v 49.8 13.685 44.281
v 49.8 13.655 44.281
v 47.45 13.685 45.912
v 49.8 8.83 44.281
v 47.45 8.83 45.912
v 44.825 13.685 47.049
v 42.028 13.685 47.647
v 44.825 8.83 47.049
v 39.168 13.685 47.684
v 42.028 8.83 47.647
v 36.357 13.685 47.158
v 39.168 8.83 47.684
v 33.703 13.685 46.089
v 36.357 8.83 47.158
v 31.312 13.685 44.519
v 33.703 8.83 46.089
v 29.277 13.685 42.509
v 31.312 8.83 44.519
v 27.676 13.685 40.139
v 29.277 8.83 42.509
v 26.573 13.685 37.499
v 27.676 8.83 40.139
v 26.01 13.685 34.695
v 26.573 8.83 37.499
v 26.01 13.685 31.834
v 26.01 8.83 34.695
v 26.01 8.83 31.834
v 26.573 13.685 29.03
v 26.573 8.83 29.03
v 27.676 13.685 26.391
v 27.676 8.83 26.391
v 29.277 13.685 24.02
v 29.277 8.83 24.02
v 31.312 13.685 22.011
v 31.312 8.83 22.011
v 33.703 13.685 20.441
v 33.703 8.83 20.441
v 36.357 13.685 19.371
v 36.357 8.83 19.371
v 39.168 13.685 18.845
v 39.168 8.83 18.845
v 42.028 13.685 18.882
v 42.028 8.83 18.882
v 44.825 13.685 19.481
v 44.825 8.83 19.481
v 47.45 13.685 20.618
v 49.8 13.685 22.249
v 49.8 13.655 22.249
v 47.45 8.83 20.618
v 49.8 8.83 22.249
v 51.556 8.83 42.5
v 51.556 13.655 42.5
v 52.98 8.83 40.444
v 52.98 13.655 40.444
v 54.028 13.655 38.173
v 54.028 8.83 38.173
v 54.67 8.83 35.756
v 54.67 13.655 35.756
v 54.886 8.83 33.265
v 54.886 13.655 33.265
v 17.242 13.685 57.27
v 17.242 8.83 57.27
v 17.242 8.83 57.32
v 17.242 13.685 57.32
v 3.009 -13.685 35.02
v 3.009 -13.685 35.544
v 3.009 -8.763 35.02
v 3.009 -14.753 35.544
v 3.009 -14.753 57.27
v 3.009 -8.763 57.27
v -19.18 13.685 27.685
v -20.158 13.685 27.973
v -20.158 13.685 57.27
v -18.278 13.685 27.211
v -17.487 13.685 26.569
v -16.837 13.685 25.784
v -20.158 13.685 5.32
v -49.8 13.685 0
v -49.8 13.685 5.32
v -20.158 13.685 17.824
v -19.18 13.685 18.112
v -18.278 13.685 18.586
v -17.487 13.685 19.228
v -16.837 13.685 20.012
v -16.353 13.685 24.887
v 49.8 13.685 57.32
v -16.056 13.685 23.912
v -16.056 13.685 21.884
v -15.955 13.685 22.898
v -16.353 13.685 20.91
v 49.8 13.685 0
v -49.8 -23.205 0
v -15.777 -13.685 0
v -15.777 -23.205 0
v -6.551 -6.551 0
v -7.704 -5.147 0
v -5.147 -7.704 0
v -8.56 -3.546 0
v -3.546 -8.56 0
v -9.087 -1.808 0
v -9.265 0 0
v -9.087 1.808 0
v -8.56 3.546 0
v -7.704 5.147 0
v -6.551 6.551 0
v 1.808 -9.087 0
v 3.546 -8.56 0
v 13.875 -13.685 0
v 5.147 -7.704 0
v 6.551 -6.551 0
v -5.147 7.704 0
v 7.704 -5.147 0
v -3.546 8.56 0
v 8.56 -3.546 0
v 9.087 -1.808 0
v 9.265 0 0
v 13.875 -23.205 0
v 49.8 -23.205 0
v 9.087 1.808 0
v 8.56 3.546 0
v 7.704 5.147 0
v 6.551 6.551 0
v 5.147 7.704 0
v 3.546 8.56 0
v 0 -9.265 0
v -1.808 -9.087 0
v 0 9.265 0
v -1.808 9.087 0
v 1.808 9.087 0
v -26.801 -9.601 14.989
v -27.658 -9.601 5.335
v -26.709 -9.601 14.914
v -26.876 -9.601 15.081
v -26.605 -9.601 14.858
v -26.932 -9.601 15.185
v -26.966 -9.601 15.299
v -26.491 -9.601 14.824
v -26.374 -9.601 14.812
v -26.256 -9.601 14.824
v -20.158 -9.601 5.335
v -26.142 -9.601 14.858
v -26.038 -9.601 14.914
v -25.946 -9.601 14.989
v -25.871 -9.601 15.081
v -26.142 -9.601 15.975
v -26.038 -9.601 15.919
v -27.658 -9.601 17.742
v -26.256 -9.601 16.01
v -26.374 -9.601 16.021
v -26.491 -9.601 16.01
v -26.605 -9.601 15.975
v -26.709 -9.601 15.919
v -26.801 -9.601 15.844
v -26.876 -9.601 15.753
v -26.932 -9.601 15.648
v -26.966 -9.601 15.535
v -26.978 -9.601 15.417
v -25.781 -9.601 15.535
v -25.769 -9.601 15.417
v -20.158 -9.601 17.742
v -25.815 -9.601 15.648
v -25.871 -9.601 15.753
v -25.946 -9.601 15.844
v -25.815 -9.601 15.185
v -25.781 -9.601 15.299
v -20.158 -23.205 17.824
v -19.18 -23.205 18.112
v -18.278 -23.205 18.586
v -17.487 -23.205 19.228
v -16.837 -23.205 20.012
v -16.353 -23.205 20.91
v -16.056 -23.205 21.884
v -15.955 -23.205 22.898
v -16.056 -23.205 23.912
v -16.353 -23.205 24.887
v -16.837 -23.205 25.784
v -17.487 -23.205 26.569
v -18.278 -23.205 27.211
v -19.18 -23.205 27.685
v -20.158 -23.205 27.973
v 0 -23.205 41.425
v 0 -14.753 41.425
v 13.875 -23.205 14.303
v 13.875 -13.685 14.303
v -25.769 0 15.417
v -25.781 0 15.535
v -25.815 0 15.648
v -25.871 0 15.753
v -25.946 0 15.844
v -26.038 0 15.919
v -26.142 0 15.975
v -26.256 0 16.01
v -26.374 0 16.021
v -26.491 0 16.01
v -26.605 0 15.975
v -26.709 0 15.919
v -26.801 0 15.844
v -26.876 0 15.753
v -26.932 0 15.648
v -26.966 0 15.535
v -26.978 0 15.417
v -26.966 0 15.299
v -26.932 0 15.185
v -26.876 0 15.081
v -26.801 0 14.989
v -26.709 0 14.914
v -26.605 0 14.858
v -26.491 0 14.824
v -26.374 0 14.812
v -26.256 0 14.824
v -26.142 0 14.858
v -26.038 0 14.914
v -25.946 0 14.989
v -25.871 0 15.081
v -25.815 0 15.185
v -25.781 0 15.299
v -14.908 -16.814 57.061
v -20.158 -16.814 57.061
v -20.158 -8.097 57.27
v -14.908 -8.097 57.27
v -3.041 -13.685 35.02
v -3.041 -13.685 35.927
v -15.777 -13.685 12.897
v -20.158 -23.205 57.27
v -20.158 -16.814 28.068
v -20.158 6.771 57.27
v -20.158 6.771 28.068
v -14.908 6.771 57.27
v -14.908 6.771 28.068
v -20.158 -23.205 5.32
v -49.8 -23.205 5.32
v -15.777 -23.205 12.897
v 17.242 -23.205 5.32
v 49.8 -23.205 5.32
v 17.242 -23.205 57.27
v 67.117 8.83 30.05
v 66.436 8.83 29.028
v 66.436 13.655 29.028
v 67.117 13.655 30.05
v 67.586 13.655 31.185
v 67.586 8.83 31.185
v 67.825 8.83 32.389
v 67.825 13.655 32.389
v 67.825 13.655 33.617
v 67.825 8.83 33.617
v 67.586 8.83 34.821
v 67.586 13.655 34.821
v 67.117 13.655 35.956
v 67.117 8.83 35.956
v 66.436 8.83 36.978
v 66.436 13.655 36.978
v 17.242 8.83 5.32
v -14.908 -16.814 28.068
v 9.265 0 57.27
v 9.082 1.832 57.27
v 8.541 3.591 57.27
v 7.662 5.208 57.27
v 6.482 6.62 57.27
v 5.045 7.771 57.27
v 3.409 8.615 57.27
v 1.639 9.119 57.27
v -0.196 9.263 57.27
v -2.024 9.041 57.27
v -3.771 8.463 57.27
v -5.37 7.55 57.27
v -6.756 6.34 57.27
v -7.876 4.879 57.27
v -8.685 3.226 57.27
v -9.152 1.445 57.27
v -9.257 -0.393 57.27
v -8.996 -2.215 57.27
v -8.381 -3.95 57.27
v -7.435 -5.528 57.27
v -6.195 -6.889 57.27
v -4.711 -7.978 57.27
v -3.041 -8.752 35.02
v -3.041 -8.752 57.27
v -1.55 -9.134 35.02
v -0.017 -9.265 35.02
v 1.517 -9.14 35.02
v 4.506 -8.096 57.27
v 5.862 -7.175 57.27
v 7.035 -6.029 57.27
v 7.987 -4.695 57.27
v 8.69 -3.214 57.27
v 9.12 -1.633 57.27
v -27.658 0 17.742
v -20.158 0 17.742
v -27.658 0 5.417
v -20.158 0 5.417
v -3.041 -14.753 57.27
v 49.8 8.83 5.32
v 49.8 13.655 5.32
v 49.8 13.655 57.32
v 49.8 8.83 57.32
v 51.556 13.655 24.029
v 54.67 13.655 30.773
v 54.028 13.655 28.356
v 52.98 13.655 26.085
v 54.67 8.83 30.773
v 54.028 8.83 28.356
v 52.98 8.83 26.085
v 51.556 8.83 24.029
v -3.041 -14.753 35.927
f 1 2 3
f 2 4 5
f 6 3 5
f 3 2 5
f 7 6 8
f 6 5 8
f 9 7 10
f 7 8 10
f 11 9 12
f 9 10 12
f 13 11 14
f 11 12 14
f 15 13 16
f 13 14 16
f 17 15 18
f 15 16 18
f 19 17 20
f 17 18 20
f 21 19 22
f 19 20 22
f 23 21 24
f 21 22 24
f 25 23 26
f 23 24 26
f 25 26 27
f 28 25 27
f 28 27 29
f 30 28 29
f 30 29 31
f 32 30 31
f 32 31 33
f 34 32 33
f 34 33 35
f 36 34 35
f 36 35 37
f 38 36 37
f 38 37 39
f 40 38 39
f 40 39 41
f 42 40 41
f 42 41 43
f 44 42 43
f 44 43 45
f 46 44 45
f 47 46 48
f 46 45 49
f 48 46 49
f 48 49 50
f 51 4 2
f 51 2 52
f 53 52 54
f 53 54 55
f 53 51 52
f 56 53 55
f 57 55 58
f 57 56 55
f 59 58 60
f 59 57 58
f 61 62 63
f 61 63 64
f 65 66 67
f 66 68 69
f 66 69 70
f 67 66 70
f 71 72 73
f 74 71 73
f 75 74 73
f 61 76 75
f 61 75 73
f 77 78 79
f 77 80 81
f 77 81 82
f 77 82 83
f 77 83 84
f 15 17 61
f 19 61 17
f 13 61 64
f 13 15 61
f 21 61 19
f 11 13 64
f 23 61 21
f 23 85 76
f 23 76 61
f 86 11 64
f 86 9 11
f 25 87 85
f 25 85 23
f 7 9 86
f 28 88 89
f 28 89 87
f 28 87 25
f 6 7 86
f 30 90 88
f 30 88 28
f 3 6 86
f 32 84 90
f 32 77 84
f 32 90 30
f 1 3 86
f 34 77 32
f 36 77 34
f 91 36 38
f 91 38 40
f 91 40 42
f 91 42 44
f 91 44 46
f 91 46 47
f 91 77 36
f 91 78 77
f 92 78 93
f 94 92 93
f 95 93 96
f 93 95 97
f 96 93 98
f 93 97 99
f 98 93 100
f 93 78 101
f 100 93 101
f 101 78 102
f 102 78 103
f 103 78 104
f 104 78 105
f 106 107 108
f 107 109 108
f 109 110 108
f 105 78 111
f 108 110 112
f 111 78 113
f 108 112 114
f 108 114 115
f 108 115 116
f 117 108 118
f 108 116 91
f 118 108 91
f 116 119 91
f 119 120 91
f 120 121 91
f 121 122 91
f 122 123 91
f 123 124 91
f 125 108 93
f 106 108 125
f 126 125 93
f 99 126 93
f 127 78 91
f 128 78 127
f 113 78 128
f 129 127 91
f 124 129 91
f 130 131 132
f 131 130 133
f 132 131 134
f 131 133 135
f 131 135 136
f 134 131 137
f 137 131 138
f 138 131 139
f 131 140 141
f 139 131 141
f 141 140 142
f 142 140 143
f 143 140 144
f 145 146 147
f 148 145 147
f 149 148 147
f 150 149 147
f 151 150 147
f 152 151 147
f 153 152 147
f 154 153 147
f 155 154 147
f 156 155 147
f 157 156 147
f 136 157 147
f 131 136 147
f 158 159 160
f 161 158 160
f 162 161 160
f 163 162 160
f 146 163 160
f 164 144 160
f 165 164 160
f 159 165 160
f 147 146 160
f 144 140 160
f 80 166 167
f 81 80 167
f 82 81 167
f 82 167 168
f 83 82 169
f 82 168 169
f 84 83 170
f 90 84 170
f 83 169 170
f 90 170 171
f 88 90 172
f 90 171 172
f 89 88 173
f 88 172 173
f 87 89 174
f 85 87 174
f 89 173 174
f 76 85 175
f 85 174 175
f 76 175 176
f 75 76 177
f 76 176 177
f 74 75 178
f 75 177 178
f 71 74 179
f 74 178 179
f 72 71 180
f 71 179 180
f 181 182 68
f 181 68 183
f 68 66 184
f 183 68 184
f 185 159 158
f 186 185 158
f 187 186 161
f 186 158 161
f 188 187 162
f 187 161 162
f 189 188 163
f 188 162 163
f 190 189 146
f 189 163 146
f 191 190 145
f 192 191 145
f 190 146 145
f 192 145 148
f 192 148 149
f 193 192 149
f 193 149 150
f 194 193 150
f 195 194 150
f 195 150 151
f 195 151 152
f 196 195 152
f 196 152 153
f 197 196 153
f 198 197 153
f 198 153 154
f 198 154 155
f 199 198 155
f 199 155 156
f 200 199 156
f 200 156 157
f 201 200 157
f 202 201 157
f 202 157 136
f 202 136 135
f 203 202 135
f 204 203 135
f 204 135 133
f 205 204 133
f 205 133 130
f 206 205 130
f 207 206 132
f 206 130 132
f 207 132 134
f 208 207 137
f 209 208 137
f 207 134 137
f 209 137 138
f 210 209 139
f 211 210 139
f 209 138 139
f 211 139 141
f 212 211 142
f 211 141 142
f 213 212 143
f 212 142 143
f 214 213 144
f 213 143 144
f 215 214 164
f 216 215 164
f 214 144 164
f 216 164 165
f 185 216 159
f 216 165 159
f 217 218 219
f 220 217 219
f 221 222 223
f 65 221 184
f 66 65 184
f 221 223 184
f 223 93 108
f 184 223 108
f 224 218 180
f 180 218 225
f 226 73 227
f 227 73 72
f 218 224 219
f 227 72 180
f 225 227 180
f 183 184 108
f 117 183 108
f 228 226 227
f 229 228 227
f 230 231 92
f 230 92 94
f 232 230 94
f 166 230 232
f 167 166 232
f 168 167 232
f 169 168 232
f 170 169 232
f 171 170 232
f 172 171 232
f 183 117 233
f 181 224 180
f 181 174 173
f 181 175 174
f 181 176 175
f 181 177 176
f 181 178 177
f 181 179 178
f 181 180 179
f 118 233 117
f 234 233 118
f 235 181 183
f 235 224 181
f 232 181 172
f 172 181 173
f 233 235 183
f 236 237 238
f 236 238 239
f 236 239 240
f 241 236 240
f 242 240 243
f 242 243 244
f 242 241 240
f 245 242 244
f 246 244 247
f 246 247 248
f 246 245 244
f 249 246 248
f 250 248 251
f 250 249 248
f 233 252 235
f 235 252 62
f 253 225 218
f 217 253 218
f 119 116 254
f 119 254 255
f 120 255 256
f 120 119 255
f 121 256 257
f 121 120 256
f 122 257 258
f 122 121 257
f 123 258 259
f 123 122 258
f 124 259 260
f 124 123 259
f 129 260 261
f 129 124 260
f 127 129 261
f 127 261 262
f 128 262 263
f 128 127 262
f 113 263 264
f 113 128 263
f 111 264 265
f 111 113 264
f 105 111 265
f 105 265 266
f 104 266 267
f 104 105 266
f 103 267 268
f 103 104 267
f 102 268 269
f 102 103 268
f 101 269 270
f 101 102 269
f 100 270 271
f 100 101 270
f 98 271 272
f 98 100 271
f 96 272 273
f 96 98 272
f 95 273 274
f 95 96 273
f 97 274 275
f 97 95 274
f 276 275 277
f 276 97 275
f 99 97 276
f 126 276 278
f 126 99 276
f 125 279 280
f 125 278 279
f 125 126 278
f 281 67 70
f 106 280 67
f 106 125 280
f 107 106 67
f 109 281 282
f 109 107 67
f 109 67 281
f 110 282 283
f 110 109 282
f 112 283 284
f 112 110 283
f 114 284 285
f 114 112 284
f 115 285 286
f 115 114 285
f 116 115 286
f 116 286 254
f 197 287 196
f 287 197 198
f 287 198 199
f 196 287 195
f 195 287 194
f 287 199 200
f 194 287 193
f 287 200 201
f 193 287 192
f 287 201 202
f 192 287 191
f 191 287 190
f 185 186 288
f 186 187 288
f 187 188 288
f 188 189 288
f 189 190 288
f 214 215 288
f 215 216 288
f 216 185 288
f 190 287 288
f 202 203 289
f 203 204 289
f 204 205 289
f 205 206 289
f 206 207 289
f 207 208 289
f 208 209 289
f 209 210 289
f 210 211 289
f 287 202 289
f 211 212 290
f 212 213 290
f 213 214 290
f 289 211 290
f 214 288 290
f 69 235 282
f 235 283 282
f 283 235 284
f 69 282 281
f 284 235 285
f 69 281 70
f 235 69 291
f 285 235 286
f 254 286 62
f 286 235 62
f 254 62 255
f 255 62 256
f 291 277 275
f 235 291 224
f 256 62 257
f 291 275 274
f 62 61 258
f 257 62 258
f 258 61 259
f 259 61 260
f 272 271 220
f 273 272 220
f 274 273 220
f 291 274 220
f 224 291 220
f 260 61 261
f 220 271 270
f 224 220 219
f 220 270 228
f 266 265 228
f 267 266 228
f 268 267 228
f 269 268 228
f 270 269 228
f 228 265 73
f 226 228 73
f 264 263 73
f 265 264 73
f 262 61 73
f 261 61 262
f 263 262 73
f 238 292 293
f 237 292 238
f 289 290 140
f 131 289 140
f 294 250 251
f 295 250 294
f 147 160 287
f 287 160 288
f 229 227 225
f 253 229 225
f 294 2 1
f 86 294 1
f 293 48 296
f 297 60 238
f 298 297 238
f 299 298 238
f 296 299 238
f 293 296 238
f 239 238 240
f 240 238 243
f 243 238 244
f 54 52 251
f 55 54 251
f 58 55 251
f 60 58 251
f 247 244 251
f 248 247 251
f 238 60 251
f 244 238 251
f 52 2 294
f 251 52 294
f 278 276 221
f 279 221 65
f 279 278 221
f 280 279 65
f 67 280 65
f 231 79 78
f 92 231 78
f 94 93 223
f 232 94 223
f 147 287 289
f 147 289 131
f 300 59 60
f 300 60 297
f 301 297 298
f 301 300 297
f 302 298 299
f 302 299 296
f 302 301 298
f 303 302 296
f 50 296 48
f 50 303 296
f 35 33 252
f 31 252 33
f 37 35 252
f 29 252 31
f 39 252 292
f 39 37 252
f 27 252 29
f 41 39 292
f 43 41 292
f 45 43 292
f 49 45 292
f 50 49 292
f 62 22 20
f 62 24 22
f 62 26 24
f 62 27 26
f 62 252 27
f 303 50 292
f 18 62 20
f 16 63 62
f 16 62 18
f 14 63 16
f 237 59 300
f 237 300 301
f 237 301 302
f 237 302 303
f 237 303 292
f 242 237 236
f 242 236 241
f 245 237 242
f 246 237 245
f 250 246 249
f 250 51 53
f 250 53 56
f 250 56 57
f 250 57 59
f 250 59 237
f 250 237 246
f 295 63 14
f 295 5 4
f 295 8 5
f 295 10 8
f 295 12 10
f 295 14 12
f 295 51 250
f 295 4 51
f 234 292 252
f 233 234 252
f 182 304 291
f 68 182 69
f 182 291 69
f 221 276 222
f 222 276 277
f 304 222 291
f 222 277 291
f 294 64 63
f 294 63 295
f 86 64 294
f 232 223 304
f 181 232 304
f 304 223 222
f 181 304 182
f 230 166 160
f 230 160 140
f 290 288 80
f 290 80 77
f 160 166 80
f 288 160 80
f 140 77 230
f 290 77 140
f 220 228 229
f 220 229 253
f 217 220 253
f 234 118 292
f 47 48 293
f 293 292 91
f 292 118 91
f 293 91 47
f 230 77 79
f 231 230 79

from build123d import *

# Parameters (mm, degrees)
F0_W      = 99.6
F0_H      = 27.37
F0_R      = 9.265
F1_DEPTH  = 5.32
F2_W      = 37.4
F2_H      = 27.37
F2_R      = 9.265
F3_DEPTH  = 51.95
F5_DEPTH  = 9.52
F7_DEPTH  = 22.25
F10_DEPTH = 37.475
F12_DEPTH = 7.5
F14_DEPTH = 5.25
F15_R     = 0.6044453377
F16_DEPTH = 25
F18_W     = 32.5579583809
F18_H     = 4.8552089012
F19_DEPTH = 52
F21_DEPTH = 4.825
F22_DEPTH = 25


with BuildPart() as f1:
    # F0 (on Top) → F1 (new body)
    with BuildSketch(Plane.XY):
        Rectangle(F0_W, F0_H)
        Circle(F0_R, mode=Mode.SUBTRACT)
    extrude(amount=F1_DEPTH)

    # F2 (on face) → F3 (join)
    with BuildSketch(Plane.XY.offset(5.32)):
        with Locations((-1.4579583809, 0)):
            Rectangle(F2_W, F2_H)
        Circle(F2_R, mode=Mode.SUBTRACT)
    extrude(amount=F3_DEPTH)

    # F4 (on face) → F5 (join)
    with BuildSketch(Plane.XZ.offset(13.685)):
        Polygon((-49.8, 0), (-15.7770887017, 0), (-15.7770887017, 12.8972763196), (0, 41.4250344038), (13.8749163598, 14.3025843427), (13.8749163598, 0), (49.8, 0), (49.8, 5.32), (17.2420416191, 5.32), (17.2420416191, 57.27), (-20.1579583809, 57.27), (-20.1579583809, 5.32), (-49.8, 5.32), align=None)
    extrude(amount=F5_DEPTH)

    # F6 (on face) → F7 (cut)
    with BuildSketch(Plane.XY.offset(57.27)):
        with BuildLine():
            ThreePointArc((3.0086552724, -8.7628887047), (-0.017033567, -9.264984342), (-3.0408557647, -8.7517667484))
            Line((-3.0408557647, -8.7517667484), (-3.0408557647, -14.7527681977))
            Line((-3.0408557647, -14.7527681977), (3.0086552724, -14.7527681977))
            Line((3.0086552724, -14.7527681977), (3.0086552724, -8.7628887047))
        make_face()
    extrude(amount=-F7_DEPTH, mode=Mode.SUBTRACT)

    # F9 (on face) → F10 (cut)
    with BuildSketch(Plane.XZ.offset(23.205)):
        with BuildLine():
            Line((-20.1579583809, 27.9725342989), (-20.1579583809, 17.8241562098))
            ThreePointArc((-20.1579583809, 17.8241562098), (-15.9551803728, 22.8983452544), (-20.1579583809, 27.9725342989))
        make_face()
    extrude(amount=-F10_DEPTH, mode=Mode.SUBTRACT)

    # F11 (on face) → F12 (join)
    with BuildSketch(Plane(origin=(-20.1579583809, 0, 0), x_dir=(0, -1, 0), z_dir=(-1, 0, 0))):
        Polygon((0, 17.7417956293), (0, 5.4170973599), (9.6006197855, 5.3354022093), (9.6006197855, 17.7417956293), align=None)
    extrude(amount=F12_DEPTH)

    # F13 (on face) → F14 (cut)
    with BuildSketch(Plane(origin=(-20.1579583809, 0, 0), x_dir=(0, -1, 0), z_dir=(-1, 0, 0))):
        Polygon((8.0970225025, 57.27), (-6.7709684372, 57.27), (-6.7709684372, 28.0677657574), (16.8139953166, 28.0677657574), (16.8139953166, 57.0610500872), align=None)
    extrude(amount=-F14_DEPTH, mode=Mode.SUBTRACT)

    # F15 (on face) → F16 (cut)
    with BuildSketch(Plane.XZ.offset(9.6006197855)):
        with Locations((-26.3735596091, 15.4167022556)):
            Circle(F15_R)
    extrude(amount=-F16_DEPTH, mode=Mode.SUBTRACT)

    # F18 (on face) → F19 (join)
    with BuildSketch(Plane.XY.offset(5.32)):
        with Locations((33.5210208096, 11.2573955494)):
            Rectangle(F18_W, F18_H)
    extrude(amount=F19_DEPTH)

    # F20 (on face) → F21 (join)
    with BuildSketch(Plane.XZ.offset(-8.8297910988)):
        with BuildLine():
            Line((49.8, 57.32), (49.8, 44.2806235084))
            ThreePointArc((49.8, 44.2806235084), (53.5530649007, 39.3313205539), (54.8859158534, 33.2646407187))
            ThreePointArc((54.8859158534, 33.2646407187), (53.5530649007, 27.1979608835), (49.8, 22.248657929))
            Line((49.8, 22.248657929), (49.8, 5.32))
            Line((49.8, 5.32), (66.4364546537, 29.0281493217))
            ThreePointArc((66.4364546537, 29.0281493217), (67.8548424387, 33.0029604957), (66.4364546537, 36.9777716696))
            Line((66.4364546537, 36.9777716696), (49.8, 57.32))
        make_face()
    extrude(amount=-F21_DEPTH)

    # F20 (on face) → F22 (cut)
    with BuildSketch(Plane.XZ.offset(-8.8297910988)):
        with BuildLine():
            ThreePointArc((25.9396215898, 33.2646407187), (40.4127687216, 18.7914935869), (54.8859158534, 33.2646407187))
            ThreePointArc((54.8859158534, 33.2646407187), (40.4127687216, 47.7377878505), (25.9396215898, 33.2646407187))
        make_face()
    extrude(amount=-F22_DEPTH, mode=Mode.SUBTRACT)


solid = f1.part
